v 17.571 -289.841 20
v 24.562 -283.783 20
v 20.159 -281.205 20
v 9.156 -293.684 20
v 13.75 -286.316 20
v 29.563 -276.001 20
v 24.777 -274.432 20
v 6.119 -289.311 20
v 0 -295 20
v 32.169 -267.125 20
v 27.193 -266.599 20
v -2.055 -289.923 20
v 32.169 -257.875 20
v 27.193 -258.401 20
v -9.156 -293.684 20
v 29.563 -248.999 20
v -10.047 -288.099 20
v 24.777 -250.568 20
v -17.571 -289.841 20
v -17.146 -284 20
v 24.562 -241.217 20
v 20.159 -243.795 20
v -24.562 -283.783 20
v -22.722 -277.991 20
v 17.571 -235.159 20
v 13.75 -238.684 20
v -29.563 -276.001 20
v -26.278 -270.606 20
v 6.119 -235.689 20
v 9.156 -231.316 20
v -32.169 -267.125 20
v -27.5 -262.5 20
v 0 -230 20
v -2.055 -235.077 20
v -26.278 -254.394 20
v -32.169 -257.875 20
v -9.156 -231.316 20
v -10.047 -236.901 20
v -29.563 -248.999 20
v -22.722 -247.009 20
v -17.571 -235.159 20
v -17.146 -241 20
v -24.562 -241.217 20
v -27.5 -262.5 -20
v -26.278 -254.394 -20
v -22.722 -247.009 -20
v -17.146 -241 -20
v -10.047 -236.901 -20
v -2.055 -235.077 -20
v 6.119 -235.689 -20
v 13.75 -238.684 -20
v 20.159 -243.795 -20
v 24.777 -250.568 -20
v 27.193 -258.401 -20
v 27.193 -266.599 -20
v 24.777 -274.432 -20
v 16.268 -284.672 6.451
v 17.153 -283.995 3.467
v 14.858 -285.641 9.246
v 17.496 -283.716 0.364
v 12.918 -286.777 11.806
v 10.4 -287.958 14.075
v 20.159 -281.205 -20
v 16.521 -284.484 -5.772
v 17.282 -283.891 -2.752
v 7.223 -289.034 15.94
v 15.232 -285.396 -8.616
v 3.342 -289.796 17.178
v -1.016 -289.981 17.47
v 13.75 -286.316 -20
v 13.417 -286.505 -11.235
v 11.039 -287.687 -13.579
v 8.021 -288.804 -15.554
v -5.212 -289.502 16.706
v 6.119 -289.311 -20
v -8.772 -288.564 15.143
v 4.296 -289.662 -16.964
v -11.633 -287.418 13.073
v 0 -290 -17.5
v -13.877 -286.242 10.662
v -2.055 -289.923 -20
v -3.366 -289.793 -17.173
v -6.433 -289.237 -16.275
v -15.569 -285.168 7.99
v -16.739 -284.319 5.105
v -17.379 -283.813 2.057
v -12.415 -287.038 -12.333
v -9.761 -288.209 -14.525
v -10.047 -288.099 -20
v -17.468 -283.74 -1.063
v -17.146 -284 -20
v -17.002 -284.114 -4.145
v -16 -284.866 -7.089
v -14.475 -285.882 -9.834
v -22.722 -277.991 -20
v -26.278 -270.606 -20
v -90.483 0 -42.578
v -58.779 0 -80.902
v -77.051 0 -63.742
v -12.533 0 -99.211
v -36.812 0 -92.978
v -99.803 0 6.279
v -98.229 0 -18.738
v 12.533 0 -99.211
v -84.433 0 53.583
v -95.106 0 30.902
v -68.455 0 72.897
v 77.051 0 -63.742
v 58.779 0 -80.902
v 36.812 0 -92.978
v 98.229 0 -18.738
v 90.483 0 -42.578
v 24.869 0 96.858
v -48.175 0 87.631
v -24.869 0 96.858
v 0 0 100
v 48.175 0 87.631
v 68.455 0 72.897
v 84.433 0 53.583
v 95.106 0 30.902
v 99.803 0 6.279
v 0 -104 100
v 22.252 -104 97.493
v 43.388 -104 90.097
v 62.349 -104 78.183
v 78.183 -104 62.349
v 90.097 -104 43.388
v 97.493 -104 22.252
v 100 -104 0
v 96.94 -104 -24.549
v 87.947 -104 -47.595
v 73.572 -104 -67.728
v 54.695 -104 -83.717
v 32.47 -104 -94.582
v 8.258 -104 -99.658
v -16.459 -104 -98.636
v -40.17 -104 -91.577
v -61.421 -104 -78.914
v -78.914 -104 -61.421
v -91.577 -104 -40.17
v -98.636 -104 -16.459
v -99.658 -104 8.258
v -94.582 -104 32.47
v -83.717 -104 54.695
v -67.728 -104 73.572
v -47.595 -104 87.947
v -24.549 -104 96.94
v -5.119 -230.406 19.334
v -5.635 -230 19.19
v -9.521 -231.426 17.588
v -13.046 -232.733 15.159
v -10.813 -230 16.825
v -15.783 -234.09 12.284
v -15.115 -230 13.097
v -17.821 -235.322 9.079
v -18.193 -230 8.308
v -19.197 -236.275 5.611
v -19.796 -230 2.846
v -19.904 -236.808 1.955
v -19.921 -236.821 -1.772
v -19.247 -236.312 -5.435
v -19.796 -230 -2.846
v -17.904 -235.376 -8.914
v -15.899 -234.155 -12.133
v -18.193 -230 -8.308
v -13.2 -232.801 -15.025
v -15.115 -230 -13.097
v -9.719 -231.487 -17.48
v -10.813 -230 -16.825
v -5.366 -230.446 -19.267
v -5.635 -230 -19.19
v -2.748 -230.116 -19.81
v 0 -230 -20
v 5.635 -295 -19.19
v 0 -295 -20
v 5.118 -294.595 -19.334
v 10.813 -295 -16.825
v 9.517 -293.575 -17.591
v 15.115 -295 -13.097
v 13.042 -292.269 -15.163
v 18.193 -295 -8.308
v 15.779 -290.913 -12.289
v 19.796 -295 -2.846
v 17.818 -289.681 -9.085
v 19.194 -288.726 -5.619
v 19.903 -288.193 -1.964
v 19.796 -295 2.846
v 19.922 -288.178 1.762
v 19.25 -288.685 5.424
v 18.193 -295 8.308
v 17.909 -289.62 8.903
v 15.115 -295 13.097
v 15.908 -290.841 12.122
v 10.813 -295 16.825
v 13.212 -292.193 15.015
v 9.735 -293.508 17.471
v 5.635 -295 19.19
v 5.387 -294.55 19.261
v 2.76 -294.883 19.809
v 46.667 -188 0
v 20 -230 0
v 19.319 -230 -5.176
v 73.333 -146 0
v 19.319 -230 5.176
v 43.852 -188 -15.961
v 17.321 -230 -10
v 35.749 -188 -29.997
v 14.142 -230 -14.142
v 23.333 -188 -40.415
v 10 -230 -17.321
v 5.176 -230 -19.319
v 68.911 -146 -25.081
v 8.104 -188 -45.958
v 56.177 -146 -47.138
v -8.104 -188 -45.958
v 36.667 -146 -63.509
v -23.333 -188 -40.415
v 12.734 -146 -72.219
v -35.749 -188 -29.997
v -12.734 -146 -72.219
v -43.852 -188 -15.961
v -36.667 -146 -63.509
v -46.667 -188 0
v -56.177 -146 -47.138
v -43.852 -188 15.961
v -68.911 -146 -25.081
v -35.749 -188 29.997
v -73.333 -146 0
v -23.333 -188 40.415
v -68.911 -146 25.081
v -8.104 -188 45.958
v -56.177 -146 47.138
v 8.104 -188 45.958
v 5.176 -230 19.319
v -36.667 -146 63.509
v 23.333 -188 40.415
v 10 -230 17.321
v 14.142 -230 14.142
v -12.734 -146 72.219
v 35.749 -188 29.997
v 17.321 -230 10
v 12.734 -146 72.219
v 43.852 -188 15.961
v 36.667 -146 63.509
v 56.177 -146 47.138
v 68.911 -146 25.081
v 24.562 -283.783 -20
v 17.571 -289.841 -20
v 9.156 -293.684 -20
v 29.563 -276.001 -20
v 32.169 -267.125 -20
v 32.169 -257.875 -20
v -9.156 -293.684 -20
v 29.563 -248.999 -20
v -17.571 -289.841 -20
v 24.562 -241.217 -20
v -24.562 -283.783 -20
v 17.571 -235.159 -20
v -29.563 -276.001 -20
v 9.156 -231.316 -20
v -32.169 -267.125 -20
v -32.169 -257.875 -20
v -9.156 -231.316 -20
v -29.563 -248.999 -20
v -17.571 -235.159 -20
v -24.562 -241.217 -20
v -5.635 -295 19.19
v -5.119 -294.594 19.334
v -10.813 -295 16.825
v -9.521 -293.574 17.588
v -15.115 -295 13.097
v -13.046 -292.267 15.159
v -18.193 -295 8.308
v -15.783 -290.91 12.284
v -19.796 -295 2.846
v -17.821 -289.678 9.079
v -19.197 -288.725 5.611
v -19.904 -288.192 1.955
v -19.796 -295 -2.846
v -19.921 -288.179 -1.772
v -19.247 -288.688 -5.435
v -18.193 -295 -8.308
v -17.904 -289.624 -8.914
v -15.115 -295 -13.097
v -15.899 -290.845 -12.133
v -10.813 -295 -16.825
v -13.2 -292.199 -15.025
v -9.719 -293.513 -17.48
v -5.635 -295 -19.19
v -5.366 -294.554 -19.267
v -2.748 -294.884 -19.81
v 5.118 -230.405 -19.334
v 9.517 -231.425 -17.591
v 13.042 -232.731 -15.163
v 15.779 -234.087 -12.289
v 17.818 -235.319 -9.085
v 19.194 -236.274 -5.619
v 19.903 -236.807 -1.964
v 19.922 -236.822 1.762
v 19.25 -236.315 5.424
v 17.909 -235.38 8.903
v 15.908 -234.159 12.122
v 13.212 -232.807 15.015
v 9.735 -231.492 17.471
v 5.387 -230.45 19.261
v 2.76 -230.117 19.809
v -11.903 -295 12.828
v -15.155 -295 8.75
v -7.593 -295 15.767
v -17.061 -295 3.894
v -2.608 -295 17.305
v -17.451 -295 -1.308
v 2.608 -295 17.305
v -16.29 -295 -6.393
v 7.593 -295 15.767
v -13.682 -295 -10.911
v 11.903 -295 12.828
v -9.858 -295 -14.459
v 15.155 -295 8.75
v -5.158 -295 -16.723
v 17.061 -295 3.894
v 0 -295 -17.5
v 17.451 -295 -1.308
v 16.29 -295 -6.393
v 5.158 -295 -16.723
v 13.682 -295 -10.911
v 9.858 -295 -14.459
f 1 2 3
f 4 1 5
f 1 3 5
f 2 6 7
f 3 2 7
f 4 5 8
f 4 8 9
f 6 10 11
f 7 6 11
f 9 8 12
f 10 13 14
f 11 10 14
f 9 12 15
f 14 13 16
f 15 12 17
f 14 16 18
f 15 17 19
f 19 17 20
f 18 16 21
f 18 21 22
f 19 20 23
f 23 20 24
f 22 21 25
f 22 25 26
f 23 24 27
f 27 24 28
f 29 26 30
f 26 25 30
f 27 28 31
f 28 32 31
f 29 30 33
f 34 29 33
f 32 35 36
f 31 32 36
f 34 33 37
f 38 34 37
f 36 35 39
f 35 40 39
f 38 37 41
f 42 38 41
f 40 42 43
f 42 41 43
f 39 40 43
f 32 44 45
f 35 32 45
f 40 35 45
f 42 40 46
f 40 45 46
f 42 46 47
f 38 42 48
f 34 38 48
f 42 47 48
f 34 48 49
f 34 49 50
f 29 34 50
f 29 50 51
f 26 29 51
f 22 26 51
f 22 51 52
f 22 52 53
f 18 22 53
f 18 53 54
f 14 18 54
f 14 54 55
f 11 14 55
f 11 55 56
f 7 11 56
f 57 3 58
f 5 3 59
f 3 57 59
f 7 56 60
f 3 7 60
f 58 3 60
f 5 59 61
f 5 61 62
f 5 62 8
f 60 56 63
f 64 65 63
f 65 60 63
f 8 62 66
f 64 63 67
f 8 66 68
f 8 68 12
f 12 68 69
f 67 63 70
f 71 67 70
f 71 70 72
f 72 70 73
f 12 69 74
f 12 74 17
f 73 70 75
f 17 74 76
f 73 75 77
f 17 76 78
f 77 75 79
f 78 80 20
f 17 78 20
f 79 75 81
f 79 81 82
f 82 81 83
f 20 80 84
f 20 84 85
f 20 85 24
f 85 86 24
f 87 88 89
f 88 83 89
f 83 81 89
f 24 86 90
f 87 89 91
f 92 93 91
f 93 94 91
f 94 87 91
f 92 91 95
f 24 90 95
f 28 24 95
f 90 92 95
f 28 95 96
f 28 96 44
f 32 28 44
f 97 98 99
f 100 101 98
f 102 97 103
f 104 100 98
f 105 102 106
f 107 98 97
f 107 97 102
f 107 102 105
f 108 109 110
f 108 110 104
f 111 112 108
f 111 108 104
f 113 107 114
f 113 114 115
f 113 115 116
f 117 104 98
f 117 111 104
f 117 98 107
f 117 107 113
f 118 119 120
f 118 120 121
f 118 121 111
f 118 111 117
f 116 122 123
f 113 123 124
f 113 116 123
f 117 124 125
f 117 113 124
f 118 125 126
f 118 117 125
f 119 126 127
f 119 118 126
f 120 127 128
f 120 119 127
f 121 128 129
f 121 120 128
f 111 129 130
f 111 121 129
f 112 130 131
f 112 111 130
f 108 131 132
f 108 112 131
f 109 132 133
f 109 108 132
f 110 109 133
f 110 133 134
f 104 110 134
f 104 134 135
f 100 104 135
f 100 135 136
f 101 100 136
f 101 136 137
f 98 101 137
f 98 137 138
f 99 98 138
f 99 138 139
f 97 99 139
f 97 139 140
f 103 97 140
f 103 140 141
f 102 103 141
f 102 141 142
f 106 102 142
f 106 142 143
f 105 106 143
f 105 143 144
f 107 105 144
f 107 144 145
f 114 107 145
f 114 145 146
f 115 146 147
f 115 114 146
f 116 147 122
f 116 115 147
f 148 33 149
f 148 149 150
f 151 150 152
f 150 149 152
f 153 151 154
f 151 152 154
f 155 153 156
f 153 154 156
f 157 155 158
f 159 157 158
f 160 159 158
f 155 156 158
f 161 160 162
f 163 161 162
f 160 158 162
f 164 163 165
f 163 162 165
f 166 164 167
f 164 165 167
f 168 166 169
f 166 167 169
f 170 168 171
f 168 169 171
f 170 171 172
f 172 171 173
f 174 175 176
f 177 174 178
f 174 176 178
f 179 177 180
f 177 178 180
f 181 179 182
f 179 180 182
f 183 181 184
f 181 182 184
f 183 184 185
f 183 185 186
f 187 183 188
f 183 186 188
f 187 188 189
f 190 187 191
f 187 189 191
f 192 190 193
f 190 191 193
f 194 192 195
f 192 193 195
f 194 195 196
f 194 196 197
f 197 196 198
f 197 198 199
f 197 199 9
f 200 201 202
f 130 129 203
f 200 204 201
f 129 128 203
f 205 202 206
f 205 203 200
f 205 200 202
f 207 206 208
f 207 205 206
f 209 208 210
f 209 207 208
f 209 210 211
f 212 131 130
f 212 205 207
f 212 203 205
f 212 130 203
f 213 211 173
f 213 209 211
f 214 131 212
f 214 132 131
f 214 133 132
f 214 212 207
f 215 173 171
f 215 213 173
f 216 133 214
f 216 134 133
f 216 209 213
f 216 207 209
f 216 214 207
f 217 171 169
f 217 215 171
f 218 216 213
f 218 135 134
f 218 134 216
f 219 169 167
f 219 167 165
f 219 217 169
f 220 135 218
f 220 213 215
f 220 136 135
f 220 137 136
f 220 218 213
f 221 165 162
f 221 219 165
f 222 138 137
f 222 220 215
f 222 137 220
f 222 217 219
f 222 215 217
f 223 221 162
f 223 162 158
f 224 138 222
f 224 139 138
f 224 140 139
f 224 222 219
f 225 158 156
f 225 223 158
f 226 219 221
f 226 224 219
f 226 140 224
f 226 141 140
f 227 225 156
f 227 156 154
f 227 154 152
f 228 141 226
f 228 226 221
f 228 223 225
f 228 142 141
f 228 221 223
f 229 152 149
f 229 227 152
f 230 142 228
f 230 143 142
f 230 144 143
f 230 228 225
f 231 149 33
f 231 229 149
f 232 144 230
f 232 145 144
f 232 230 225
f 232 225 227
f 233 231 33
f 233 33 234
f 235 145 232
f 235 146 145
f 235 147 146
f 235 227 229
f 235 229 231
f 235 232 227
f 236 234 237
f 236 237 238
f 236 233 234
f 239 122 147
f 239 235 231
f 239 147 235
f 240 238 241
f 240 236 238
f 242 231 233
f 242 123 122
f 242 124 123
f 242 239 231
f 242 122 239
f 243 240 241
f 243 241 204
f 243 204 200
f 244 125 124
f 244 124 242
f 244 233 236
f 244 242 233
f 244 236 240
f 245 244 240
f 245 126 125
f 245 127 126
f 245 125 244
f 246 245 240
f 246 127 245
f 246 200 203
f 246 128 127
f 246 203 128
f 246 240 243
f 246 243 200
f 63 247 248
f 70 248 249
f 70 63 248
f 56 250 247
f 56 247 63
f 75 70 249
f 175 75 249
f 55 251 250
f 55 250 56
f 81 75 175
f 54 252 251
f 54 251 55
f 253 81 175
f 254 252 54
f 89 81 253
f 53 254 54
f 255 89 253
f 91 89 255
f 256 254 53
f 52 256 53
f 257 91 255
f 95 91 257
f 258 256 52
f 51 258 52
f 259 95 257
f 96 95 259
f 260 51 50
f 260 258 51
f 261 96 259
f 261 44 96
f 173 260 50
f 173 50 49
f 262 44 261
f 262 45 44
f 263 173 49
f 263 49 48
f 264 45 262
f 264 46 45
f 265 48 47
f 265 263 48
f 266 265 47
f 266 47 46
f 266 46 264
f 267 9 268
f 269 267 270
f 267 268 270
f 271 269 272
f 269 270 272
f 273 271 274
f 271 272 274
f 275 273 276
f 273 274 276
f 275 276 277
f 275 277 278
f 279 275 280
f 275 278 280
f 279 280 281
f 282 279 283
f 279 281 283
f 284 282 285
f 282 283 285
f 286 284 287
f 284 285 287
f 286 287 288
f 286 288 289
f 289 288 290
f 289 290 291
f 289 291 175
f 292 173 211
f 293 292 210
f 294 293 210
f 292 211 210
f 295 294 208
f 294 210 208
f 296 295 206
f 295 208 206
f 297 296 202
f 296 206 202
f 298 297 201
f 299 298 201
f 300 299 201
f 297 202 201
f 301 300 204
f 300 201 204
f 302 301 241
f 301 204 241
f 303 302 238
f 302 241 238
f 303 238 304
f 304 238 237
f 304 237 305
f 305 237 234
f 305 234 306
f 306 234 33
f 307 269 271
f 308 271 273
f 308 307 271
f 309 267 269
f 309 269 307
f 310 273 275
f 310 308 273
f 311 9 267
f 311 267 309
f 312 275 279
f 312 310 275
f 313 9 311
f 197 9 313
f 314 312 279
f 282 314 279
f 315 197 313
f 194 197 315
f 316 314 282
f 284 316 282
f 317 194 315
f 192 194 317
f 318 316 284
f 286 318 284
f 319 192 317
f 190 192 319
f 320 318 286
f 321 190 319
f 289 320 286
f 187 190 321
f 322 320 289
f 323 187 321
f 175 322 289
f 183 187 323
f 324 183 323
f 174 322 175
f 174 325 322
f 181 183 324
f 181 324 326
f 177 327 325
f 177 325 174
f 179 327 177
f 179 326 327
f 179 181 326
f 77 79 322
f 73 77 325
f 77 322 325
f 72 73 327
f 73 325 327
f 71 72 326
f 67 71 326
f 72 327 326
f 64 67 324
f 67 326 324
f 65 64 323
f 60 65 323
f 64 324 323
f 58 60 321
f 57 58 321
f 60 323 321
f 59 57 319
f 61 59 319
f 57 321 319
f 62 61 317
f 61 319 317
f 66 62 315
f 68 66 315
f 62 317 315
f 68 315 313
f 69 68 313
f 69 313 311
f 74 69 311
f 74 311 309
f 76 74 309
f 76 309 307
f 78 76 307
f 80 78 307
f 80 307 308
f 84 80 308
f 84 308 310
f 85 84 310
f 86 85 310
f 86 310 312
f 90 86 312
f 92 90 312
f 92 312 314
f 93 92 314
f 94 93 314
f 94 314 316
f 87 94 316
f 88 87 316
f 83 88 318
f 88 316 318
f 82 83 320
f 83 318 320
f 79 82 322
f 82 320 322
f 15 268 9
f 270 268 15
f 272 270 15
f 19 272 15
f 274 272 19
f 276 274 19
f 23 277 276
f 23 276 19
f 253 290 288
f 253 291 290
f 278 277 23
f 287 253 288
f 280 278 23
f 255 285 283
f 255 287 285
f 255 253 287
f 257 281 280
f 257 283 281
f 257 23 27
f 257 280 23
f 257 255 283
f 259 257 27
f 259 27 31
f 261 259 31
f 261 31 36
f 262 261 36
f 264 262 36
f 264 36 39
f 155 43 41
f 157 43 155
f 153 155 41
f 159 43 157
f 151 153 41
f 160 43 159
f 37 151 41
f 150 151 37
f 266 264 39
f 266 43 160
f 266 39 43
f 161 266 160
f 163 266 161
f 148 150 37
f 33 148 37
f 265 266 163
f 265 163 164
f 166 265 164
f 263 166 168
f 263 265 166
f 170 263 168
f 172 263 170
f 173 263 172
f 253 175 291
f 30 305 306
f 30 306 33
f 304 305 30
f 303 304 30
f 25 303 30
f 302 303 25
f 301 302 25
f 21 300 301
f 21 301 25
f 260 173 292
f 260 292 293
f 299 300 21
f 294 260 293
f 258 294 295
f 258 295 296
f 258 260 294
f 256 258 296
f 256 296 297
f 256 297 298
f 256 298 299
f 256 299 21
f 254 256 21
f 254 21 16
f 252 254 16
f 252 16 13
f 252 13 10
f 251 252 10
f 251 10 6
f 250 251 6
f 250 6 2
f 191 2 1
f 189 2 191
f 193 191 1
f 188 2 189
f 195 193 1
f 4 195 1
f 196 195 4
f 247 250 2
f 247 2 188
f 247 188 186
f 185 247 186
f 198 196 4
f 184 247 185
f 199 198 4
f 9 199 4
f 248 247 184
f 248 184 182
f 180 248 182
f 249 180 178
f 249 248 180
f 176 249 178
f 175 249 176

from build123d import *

# Parameters (mm, degrees)
CROQUIS1_R              = 100
SALIENTE_EXTRUIR1_DEPTH = 104
CROQUIS3_R              = 20
CROQUIS2_R              = 100
CROQUIS4_R              = 20
SALIENTE_EXTRUIR2_DEPTH = 65
CROQUIS5_R              = 32.5
SALIENTE_EXTRUIR3_DEPTH = 40
CROQUIS6_R              = 27.5
CORTAR_EXTRUIR1_DEPTH   = 334.803834764
CROQUIS7_R              = 17.5
CORTAR_EXTRUIR2_DEPTH   = 24


with BuildPart() as part:
    # Croquis1 → Saliente-Extruir1 (new body)
    with BuildSketch(Plane(origin=(0, 0, 0), x_dir=(1, 0, 0), z_dir=(0, 1, 0))):
        with Locations(Location((0, 0, 0), (0, 0, 270))):
            Circle(CROQUIS1_R)
    extrude(amount=-SALIENTE_EXTRUIR1_DEPTH)

    # Croquis3 → Recubrir1 section 0
    with BuildSketch(Plane(origin=(0, -230, 0), x_dir=(1, 0, 0), z_dir=(0, 1, 0))):
        Circle(CROQUIS3_R)
    # Croquis2 → Recubrir1 section 1
    with BuildSketch(Plane.XZ.offset(104)):
        Circle(CROQUIS2_R)
    loft()

    # Croquis4 → Saliente-Extruir2 (add)
    with BuildSketch(Plane.XZ.offset(230)):
        with Locations(Location((0, 0, 0), (0, 0, 270))):
            Circle(CROQUIS4_R)
    extrude(amount=SALIENTE_EXTRUIR2_DEPTH)

    # Croquis5 → Saliente-Extruir3 (add)
    with BuildSketch(Plane(origin=(0, 0, -20), x_dir=(-1, 0, 0), z_dir=(0, 0, -1))):
        with Locations((0, -262.5)):
            Circle(CROQUIS5_R)
    extrude(amount=-SALIENTE_EXTRUIR3_DEPTH)

    # Croquis6 → Cortar-Extruir1 (cut, through all)
    with BuildSketch(Plane(origin=(0, 0, -20), x_dir=(-1, 0, 0), z_dir=(0, 0, -1))):
        with Locations((0, -262.5)):
            Circle(CROQUIS6_R)
    extrude(amount=-CORTAR_EXTRUIR1_DEPTH, mode=Mode.SUBTRACT)

    # Croquis7 → Cortar-Extruir2 (cut)
    with BuildSketch(Plane.XZ.offset(295)):
        with Locations(Location((0, 0, 0), (0, 0, 270))):
            Circle(CROQUIS7_R)
    extrude(amount=-CORTAR_EXTRUIR2_DEPTH, mode=Mode.SUBTRACT)


solid = part.part
